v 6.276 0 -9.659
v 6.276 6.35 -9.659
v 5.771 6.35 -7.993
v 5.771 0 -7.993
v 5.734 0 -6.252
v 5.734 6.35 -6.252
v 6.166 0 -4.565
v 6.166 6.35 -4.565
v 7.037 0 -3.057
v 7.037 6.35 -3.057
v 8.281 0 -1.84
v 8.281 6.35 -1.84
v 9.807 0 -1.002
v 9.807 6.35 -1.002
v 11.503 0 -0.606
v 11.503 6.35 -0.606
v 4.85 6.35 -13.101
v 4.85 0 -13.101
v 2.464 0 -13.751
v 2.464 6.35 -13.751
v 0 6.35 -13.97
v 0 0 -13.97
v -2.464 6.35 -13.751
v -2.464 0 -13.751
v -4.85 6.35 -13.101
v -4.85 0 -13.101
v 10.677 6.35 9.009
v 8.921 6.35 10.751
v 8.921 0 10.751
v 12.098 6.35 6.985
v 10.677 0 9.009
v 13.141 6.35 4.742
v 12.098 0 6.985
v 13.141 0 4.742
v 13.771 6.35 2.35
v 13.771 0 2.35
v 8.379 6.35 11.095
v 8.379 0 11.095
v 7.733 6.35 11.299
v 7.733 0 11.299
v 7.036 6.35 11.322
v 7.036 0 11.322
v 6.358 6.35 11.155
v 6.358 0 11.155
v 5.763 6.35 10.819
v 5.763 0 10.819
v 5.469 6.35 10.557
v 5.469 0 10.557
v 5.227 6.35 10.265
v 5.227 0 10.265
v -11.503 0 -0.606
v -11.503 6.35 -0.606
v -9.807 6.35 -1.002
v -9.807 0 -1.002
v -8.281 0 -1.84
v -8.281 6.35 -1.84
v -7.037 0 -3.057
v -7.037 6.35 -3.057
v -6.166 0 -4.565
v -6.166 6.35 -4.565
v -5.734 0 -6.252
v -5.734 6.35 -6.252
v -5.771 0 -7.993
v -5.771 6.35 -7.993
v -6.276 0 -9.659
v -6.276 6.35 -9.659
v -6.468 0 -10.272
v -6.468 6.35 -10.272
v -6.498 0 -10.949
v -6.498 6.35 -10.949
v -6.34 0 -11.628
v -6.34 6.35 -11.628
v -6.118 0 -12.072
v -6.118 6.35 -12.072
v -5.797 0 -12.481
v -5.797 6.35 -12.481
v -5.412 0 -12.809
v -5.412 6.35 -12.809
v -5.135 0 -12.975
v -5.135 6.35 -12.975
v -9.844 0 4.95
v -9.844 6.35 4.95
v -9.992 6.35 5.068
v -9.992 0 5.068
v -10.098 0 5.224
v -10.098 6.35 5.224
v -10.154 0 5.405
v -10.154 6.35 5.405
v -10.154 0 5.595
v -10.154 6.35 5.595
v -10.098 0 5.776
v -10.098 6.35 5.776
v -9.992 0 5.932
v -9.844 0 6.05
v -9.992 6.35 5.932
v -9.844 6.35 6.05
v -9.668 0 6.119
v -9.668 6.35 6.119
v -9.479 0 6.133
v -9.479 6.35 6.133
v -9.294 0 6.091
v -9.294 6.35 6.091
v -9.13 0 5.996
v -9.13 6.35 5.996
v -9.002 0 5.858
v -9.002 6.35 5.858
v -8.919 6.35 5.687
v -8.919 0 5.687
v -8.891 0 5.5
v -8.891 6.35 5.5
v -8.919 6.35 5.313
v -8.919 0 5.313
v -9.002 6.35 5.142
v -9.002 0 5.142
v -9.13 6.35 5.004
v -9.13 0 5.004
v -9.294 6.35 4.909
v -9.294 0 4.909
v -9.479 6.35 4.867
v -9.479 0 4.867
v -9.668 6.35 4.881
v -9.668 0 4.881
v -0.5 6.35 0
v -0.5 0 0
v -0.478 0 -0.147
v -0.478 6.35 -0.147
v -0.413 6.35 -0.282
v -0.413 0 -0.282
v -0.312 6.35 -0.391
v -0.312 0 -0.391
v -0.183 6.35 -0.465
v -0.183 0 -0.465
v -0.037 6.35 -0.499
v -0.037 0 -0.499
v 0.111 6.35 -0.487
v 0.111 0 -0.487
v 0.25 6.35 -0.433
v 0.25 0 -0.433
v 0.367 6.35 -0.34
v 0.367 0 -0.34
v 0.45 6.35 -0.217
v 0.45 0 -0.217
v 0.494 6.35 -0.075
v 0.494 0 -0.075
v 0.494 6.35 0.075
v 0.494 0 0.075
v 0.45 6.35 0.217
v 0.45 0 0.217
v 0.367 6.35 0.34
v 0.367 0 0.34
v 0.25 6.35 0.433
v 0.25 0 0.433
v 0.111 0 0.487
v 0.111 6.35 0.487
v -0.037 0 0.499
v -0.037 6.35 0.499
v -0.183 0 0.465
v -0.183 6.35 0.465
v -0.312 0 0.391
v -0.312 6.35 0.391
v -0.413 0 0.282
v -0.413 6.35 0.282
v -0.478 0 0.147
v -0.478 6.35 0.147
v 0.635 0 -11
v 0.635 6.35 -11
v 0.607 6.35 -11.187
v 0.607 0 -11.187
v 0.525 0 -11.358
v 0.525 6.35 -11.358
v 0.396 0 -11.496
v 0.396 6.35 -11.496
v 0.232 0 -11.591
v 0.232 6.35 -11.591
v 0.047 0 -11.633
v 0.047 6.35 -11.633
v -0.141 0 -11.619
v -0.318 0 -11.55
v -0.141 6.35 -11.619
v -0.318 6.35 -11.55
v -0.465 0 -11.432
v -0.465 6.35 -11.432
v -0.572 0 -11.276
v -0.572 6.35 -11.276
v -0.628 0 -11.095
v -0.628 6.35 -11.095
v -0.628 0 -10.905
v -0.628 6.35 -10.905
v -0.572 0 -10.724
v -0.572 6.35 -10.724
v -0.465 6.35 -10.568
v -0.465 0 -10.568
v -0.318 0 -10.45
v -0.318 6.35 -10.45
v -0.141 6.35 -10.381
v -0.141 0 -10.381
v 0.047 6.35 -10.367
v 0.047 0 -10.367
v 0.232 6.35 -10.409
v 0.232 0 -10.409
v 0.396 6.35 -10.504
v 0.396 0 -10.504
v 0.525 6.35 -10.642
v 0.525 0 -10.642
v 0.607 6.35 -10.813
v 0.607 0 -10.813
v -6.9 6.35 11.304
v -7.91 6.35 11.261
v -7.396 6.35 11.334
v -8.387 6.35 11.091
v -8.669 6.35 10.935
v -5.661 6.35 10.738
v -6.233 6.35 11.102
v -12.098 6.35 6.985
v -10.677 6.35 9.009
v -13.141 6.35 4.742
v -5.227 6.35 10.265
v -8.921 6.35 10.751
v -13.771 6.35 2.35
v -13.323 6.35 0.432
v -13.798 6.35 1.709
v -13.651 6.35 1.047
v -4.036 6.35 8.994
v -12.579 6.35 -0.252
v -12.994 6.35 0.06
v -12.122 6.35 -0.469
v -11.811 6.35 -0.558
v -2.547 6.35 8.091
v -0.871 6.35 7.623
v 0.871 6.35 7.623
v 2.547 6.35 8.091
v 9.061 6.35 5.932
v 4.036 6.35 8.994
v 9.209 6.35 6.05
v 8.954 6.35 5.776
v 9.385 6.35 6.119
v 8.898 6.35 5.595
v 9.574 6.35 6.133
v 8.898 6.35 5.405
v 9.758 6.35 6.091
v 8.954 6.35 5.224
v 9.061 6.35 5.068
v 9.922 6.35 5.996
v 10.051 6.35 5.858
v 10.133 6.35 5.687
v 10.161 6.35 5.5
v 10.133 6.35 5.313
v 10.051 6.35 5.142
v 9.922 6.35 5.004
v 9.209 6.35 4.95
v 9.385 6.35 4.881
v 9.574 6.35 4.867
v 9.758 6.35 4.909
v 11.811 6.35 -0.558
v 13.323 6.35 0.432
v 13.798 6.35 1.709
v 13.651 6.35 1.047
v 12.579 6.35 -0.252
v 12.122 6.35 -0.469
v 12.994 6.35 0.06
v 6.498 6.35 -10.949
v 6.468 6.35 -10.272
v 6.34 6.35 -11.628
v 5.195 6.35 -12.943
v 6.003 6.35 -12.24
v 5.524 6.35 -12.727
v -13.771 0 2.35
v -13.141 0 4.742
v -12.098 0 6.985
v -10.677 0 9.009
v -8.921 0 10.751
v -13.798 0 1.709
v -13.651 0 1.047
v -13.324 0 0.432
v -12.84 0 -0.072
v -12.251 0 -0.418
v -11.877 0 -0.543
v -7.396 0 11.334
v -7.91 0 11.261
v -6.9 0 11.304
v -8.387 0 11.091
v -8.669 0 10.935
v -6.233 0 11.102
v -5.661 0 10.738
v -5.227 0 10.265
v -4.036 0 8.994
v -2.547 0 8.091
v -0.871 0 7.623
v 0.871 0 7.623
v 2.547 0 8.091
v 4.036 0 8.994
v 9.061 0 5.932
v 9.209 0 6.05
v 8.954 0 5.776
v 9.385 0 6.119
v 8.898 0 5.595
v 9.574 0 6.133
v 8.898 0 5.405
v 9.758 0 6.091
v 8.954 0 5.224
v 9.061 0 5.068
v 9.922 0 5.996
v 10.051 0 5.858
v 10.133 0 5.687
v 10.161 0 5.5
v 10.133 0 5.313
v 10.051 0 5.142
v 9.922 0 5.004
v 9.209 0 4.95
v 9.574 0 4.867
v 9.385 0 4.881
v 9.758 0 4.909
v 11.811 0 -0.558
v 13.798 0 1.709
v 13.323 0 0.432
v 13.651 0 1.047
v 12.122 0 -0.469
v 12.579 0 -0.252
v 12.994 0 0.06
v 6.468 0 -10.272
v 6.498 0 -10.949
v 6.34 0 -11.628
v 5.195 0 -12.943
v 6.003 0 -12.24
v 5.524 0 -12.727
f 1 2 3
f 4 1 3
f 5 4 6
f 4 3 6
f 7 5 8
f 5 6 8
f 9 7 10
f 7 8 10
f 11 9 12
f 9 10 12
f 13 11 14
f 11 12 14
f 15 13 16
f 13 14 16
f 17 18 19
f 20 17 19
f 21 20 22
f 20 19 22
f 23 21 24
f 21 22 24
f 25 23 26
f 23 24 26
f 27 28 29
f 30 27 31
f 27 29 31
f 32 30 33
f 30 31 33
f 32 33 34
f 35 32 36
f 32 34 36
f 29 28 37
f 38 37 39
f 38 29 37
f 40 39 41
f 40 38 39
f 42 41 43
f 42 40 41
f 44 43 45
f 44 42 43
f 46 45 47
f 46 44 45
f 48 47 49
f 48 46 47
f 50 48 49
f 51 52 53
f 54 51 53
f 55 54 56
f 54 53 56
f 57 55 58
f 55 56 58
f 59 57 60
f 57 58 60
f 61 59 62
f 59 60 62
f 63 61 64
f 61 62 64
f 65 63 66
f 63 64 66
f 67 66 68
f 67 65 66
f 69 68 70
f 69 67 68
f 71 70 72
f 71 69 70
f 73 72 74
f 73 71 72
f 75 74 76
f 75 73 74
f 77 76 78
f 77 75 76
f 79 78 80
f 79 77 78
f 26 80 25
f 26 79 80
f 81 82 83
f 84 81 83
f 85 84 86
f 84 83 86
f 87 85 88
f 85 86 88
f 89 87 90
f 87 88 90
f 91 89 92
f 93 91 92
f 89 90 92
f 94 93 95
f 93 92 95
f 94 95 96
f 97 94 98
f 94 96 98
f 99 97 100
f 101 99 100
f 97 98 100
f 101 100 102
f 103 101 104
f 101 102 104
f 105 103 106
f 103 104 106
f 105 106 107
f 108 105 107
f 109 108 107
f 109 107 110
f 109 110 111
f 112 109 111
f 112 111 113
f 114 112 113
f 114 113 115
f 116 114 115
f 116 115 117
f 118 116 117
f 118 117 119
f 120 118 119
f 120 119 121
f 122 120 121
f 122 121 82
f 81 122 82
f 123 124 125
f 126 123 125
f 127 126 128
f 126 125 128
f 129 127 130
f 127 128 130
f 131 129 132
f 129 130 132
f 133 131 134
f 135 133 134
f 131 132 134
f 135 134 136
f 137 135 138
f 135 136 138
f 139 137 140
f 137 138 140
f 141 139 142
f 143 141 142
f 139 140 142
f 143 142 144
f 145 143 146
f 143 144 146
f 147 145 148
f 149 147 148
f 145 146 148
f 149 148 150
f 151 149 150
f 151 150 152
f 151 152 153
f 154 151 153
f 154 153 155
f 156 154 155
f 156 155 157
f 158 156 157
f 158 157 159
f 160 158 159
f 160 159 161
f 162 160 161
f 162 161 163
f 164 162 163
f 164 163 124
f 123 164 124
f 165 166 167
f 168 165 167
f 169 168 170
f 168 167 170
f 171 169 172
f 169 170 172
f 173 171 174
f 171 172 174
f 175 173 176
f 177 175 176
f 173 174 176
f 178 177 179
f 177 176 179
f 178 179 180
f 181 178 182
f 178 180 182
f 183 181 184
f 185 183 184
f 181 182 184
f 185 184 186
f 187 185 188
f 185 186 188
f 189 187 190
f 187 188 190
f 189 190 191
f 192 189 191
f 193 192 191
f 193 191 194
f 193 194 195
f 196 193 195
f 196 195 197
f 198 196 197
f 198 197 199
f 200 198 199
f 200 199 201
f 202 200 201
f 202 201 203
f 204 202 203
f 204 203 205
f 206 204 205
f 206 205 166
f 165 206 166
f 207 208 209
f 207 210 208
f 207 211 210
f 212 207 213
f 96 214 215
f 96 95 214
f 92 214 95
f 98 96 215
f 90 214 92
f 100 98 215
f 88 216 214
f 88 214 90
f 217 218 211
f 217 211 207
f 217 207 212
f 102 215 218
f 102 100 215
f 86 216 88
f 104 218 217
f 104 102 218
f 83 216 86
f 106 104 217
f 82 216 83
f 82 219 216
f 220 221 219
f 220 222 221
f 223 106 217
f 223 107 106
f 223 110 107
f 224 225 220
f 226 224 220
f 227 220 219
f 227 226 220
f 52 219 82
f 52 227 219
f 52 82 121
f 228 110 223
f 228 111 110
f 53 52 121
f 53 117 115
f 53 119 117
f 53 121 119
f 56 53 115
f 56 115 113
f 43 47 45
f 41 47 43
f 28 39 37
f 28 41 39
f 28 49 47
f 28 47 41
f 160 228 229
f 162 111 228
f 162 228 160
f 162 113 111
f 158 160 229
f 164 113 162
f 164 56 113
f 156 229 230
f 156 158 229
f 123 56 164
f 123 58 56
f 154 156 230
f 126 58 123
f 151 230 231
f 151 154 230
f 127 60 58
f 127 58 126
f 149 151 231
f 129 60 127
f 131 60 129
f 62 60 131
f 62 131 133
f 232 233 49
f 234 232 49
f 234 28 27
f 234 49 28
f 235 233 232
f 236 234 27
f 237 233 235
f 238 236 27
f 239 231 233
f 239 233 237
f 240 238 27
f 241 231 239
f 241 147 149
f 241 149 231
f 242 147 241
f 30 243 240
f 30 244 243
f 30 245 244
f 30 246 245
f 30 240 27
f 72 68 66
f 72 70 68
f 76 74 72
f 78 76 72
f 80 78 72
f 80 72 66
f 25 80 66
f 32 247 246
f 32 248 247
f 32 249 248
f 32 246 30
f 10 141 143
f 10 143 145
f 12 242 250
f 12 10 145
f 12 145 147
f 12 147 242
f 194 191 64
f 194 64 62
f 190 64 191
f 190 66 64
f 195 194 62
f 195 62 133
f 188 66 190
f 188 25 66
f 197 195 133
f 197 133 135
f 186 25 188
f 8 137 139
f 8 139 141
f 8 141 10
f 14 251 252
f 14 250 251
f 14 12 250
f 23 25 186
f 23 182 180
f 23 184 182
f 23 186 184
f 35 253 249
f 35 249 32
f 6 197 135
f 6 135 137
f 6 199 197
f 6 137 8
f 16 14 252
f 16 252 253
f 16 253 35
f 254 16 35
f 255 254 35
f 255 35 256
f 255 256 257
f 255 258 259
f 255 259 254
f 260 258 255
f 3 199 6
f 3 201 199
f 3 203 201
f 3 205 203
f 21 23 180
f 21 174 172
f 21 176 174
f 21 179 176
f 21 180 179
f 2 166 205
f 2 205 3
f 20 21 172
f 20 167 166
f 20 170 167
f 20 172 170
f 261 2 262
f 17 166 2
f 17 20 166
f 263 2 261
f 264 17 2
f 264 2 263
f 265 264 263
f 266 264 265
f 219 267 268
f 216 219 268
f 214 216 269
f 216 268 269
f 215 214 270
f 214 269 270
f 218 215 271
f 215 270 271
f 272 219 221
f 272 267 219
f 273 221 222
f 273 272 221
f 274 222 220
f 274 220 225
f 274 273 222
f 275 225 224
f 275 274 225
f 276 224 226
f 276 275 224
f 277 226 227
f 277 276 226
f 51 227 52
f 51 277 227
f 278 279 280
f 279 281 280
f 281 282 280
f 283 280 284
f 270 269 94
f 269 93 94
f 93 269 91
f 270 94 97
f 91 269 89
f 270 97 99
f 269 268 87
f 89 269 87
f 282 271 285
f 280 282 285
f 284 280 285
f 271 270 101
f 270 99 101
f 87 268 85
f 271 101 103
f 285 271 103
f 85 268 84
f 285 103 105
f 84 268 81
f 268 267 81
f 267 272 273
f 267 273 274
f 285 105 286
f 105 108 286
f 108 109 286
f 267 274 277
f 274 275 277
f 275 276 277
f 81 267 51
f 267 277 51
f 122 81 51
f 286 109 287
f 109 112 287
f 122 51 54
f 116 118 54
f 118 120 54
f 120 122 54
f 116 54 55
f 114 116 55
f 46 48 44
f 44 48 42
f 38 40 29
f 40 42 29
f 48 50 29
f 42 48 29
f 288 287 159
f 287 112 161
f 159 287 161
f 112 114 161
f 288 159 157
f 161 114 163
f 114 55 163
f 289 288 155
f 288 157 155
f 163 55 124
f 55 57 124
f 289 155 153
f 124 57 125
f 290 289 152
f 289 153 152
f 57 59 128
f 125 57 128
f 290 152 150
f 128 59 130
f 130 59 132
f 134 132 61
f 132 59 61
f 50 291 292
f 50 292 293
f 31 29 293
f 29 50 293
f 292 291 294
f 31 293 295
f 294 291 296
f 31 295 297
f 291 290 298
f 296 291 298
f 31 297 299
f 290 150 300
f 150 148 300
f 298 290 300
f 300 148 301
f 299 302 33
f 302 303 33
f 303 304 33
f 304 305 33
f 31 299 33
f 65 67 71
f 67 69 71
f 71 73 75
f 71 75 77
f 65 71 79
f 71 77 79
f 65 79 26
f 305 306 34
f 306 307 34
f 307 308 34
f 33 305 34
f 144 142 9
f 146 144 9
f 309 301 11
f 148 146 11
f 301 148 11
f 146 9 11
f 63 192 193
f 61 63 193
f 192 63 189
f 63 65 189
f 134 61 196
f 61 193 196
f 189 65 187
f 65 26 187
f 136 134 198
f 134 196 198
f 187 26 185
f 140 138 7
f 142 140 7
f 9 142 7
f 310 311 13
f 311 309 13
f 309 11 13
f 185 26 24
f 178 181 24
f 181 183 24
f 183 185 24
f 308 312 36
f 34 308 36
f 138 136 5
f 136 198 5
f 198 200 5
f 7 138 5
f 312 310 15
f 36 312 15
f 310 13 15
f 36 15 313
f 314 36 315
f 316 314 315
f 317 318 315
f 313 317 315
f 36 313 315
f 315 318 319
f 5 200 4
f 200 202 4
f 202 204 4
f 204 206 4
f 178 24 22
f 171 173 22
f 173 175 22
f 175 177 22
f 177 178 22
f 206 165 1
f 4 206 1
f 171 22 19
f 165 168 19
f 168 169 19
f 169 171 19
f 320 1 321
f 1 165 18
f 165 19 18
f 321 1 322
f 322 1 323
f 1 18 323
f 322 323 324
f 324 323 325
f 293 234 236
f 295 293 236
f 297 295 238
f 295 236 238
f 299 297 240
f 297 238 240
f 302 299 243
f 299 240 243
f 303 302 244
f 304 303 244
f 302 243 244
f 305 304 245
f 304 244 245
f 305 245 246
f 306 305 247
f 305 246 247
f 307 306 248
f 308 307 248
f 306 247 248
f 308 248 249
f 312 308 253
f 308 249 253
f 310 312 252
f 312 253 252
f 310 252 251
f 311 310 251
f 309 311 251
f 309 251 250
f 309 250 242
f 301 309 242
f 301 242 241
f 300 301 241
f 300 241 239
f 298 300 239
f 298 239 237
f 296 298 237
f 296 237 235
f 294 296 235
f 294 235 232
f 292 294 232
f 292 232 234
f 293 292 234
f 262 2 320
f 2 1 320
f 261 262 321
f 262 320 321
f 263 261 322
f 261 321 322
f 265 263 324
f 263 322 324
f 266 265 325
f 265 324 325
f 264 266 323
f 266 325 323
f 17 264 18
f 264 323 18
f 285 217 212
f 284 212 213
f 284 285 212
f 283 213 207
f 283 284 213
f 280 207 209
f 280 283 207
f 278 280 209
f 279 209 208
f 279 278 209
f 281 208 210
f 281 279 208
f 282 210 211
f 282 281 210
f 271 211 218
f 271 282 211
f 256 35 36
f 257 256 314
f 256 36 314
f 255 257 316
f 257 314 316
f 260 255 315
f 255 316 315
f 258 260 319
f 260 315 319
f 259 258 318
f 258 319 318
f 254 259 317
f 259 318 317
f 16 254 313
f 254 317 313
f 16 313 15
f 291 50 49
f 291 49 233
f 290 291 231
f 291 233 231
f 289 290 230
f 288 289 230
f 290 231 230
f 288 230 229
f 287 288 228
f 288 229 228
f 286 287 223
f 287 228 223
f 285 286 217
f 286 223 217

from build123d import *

# Parameters (mm, degrees)
SKETCH1_R                       = 13.97
BOSS_EXTRUDE1_DEPTH             = 6.35
SKETCH2_R                       = 0.635
CUT_EXTRUDE1_DEPTH              = 21.751970991
CIRPATTERN1_COUNT               = 3
SKETCH4_R                       = 6.406839675
CUT_EXTRUDE3_DEPTH              = 21.751970991
CIRPATTERN2_COUNT               = 3
FILLET1_R                       = 2.54
F_1_0MM_PRESS_DOWEL_HOLE1_D     = 1
F_1_0MM_PRESS_DOWEL_HOLE1_DEPTH = 24.892
F_1_0MM_PRESS_DOWEL_HOLE1_TIP   = 0.30043031


with BuildPart() as part:
    # Sketch1 → Boss-Extrude1 (new body)
    with BuildSketch(Plane(origin=(0, 0, 0), x_dir=(1, 0, 0), z_dir=(0, 1, 0))):
        Circle(SKETCH1_R)
    extrude(amount=BOSS_EXTRUDE1_DEPTH)

    # Sketch2 → Cut-Extrude1 (cut, through all)
    with BuildSketch(Plane(origin=(0, 6.35, 0), x_dir=(1, 0, 0), z_dir=(0, 1, 0))):
        with Locations((0, 11)):
            Circle(SKETCH2_R)
    cut_extrude1 = extrude(amount=-CUT_EXTRUDE1_DEPTH, mode=Mode.SUBTRACT)

    # CirPattern1: Cut-Extrude1 ×3 about axis
    cirpattern1_axis = Axis((0, 6.35, 0), (0, -1, 0))
    for i in range(1, CIRPATTERN1_COUNT):
        add(cut_extrude1.rotate(cirpattern1_axis, i * 360 / CIRPATTERN1_COUNT), mode=Mode.SUBTRACT)

    # Sketch4 → Cut-Extrude3 (cut, through all)
    with BuildSketch(Plane(origin=(0, 6.35, 0), x_dir=(1, 0, 0), z_dir=(0, 1, 0))):
        with Locations((0, -13.97)):
            Circle(SKETCH4_R)
    cut_extrude3 = extrude(amount=-CUT_EXTRUDE3_DEPTH, mode=Mode.SUBTRACT)

    # CirPattern2: Cut-Extrude3 ×3 about axis
    cirpattern2_axis = Axis((0, 6.35, 0), (0, -1, 0))
    for i in range(1, CIRPATTERN2_COUNT):
        add(cut_extrude3.rotate(cirpattern2_axis, i * 360 / CIRPATTERN2_COUNT), mode=Mode.SUBTRACT)

    # Fillet1
    fillet1_edges = [part.edges().sort_by_distance(p)[0] for p in [
        (13.944129749, 3.175, -0.849791477),
        (6.236123867, 3.175, 12.500866334),
        (-6.236123867, 3.175, 12.500866334),
        (-13.944129749, 3.175, -0.849791477),
        (-7.708005881, 3.175, -11.651074857),
        (7.708005881, 3.175, -11.651074857),
    ]]
    fillet(fillet1_edges, radius=FILLET1_R)

    # Ø1.0mm Press Dowel Hole1
    with Locations(Plane(origin=(0, 6.35, 0), x_dir=(1, 0, 0), z_dir=(0, 1, 0))):
        with Locations((0, 0)):
            Hole(F_1_0MM_PRESS_DOWEL_HOLE1_D / 2, depth=F_1_0MM_PRESS_DOWEL_HOLE1_DEPTH)
            with Locations((0, 0, -(F_1_0MM_PRESS_DOWEL_HOLE1_DEPTH + F_1_0MM_PRESS_DOWEL_HOLE1_TIP / 2))):  # 118° drill point
                Cone(0, F_1_0MM_PRESS_DOWEL_HOLE1_D / 2, F_1_0MM_PRESS_DOWEL_HOLE1_TIP, mode=Mode.SUBTRACT)


solid = part.part
